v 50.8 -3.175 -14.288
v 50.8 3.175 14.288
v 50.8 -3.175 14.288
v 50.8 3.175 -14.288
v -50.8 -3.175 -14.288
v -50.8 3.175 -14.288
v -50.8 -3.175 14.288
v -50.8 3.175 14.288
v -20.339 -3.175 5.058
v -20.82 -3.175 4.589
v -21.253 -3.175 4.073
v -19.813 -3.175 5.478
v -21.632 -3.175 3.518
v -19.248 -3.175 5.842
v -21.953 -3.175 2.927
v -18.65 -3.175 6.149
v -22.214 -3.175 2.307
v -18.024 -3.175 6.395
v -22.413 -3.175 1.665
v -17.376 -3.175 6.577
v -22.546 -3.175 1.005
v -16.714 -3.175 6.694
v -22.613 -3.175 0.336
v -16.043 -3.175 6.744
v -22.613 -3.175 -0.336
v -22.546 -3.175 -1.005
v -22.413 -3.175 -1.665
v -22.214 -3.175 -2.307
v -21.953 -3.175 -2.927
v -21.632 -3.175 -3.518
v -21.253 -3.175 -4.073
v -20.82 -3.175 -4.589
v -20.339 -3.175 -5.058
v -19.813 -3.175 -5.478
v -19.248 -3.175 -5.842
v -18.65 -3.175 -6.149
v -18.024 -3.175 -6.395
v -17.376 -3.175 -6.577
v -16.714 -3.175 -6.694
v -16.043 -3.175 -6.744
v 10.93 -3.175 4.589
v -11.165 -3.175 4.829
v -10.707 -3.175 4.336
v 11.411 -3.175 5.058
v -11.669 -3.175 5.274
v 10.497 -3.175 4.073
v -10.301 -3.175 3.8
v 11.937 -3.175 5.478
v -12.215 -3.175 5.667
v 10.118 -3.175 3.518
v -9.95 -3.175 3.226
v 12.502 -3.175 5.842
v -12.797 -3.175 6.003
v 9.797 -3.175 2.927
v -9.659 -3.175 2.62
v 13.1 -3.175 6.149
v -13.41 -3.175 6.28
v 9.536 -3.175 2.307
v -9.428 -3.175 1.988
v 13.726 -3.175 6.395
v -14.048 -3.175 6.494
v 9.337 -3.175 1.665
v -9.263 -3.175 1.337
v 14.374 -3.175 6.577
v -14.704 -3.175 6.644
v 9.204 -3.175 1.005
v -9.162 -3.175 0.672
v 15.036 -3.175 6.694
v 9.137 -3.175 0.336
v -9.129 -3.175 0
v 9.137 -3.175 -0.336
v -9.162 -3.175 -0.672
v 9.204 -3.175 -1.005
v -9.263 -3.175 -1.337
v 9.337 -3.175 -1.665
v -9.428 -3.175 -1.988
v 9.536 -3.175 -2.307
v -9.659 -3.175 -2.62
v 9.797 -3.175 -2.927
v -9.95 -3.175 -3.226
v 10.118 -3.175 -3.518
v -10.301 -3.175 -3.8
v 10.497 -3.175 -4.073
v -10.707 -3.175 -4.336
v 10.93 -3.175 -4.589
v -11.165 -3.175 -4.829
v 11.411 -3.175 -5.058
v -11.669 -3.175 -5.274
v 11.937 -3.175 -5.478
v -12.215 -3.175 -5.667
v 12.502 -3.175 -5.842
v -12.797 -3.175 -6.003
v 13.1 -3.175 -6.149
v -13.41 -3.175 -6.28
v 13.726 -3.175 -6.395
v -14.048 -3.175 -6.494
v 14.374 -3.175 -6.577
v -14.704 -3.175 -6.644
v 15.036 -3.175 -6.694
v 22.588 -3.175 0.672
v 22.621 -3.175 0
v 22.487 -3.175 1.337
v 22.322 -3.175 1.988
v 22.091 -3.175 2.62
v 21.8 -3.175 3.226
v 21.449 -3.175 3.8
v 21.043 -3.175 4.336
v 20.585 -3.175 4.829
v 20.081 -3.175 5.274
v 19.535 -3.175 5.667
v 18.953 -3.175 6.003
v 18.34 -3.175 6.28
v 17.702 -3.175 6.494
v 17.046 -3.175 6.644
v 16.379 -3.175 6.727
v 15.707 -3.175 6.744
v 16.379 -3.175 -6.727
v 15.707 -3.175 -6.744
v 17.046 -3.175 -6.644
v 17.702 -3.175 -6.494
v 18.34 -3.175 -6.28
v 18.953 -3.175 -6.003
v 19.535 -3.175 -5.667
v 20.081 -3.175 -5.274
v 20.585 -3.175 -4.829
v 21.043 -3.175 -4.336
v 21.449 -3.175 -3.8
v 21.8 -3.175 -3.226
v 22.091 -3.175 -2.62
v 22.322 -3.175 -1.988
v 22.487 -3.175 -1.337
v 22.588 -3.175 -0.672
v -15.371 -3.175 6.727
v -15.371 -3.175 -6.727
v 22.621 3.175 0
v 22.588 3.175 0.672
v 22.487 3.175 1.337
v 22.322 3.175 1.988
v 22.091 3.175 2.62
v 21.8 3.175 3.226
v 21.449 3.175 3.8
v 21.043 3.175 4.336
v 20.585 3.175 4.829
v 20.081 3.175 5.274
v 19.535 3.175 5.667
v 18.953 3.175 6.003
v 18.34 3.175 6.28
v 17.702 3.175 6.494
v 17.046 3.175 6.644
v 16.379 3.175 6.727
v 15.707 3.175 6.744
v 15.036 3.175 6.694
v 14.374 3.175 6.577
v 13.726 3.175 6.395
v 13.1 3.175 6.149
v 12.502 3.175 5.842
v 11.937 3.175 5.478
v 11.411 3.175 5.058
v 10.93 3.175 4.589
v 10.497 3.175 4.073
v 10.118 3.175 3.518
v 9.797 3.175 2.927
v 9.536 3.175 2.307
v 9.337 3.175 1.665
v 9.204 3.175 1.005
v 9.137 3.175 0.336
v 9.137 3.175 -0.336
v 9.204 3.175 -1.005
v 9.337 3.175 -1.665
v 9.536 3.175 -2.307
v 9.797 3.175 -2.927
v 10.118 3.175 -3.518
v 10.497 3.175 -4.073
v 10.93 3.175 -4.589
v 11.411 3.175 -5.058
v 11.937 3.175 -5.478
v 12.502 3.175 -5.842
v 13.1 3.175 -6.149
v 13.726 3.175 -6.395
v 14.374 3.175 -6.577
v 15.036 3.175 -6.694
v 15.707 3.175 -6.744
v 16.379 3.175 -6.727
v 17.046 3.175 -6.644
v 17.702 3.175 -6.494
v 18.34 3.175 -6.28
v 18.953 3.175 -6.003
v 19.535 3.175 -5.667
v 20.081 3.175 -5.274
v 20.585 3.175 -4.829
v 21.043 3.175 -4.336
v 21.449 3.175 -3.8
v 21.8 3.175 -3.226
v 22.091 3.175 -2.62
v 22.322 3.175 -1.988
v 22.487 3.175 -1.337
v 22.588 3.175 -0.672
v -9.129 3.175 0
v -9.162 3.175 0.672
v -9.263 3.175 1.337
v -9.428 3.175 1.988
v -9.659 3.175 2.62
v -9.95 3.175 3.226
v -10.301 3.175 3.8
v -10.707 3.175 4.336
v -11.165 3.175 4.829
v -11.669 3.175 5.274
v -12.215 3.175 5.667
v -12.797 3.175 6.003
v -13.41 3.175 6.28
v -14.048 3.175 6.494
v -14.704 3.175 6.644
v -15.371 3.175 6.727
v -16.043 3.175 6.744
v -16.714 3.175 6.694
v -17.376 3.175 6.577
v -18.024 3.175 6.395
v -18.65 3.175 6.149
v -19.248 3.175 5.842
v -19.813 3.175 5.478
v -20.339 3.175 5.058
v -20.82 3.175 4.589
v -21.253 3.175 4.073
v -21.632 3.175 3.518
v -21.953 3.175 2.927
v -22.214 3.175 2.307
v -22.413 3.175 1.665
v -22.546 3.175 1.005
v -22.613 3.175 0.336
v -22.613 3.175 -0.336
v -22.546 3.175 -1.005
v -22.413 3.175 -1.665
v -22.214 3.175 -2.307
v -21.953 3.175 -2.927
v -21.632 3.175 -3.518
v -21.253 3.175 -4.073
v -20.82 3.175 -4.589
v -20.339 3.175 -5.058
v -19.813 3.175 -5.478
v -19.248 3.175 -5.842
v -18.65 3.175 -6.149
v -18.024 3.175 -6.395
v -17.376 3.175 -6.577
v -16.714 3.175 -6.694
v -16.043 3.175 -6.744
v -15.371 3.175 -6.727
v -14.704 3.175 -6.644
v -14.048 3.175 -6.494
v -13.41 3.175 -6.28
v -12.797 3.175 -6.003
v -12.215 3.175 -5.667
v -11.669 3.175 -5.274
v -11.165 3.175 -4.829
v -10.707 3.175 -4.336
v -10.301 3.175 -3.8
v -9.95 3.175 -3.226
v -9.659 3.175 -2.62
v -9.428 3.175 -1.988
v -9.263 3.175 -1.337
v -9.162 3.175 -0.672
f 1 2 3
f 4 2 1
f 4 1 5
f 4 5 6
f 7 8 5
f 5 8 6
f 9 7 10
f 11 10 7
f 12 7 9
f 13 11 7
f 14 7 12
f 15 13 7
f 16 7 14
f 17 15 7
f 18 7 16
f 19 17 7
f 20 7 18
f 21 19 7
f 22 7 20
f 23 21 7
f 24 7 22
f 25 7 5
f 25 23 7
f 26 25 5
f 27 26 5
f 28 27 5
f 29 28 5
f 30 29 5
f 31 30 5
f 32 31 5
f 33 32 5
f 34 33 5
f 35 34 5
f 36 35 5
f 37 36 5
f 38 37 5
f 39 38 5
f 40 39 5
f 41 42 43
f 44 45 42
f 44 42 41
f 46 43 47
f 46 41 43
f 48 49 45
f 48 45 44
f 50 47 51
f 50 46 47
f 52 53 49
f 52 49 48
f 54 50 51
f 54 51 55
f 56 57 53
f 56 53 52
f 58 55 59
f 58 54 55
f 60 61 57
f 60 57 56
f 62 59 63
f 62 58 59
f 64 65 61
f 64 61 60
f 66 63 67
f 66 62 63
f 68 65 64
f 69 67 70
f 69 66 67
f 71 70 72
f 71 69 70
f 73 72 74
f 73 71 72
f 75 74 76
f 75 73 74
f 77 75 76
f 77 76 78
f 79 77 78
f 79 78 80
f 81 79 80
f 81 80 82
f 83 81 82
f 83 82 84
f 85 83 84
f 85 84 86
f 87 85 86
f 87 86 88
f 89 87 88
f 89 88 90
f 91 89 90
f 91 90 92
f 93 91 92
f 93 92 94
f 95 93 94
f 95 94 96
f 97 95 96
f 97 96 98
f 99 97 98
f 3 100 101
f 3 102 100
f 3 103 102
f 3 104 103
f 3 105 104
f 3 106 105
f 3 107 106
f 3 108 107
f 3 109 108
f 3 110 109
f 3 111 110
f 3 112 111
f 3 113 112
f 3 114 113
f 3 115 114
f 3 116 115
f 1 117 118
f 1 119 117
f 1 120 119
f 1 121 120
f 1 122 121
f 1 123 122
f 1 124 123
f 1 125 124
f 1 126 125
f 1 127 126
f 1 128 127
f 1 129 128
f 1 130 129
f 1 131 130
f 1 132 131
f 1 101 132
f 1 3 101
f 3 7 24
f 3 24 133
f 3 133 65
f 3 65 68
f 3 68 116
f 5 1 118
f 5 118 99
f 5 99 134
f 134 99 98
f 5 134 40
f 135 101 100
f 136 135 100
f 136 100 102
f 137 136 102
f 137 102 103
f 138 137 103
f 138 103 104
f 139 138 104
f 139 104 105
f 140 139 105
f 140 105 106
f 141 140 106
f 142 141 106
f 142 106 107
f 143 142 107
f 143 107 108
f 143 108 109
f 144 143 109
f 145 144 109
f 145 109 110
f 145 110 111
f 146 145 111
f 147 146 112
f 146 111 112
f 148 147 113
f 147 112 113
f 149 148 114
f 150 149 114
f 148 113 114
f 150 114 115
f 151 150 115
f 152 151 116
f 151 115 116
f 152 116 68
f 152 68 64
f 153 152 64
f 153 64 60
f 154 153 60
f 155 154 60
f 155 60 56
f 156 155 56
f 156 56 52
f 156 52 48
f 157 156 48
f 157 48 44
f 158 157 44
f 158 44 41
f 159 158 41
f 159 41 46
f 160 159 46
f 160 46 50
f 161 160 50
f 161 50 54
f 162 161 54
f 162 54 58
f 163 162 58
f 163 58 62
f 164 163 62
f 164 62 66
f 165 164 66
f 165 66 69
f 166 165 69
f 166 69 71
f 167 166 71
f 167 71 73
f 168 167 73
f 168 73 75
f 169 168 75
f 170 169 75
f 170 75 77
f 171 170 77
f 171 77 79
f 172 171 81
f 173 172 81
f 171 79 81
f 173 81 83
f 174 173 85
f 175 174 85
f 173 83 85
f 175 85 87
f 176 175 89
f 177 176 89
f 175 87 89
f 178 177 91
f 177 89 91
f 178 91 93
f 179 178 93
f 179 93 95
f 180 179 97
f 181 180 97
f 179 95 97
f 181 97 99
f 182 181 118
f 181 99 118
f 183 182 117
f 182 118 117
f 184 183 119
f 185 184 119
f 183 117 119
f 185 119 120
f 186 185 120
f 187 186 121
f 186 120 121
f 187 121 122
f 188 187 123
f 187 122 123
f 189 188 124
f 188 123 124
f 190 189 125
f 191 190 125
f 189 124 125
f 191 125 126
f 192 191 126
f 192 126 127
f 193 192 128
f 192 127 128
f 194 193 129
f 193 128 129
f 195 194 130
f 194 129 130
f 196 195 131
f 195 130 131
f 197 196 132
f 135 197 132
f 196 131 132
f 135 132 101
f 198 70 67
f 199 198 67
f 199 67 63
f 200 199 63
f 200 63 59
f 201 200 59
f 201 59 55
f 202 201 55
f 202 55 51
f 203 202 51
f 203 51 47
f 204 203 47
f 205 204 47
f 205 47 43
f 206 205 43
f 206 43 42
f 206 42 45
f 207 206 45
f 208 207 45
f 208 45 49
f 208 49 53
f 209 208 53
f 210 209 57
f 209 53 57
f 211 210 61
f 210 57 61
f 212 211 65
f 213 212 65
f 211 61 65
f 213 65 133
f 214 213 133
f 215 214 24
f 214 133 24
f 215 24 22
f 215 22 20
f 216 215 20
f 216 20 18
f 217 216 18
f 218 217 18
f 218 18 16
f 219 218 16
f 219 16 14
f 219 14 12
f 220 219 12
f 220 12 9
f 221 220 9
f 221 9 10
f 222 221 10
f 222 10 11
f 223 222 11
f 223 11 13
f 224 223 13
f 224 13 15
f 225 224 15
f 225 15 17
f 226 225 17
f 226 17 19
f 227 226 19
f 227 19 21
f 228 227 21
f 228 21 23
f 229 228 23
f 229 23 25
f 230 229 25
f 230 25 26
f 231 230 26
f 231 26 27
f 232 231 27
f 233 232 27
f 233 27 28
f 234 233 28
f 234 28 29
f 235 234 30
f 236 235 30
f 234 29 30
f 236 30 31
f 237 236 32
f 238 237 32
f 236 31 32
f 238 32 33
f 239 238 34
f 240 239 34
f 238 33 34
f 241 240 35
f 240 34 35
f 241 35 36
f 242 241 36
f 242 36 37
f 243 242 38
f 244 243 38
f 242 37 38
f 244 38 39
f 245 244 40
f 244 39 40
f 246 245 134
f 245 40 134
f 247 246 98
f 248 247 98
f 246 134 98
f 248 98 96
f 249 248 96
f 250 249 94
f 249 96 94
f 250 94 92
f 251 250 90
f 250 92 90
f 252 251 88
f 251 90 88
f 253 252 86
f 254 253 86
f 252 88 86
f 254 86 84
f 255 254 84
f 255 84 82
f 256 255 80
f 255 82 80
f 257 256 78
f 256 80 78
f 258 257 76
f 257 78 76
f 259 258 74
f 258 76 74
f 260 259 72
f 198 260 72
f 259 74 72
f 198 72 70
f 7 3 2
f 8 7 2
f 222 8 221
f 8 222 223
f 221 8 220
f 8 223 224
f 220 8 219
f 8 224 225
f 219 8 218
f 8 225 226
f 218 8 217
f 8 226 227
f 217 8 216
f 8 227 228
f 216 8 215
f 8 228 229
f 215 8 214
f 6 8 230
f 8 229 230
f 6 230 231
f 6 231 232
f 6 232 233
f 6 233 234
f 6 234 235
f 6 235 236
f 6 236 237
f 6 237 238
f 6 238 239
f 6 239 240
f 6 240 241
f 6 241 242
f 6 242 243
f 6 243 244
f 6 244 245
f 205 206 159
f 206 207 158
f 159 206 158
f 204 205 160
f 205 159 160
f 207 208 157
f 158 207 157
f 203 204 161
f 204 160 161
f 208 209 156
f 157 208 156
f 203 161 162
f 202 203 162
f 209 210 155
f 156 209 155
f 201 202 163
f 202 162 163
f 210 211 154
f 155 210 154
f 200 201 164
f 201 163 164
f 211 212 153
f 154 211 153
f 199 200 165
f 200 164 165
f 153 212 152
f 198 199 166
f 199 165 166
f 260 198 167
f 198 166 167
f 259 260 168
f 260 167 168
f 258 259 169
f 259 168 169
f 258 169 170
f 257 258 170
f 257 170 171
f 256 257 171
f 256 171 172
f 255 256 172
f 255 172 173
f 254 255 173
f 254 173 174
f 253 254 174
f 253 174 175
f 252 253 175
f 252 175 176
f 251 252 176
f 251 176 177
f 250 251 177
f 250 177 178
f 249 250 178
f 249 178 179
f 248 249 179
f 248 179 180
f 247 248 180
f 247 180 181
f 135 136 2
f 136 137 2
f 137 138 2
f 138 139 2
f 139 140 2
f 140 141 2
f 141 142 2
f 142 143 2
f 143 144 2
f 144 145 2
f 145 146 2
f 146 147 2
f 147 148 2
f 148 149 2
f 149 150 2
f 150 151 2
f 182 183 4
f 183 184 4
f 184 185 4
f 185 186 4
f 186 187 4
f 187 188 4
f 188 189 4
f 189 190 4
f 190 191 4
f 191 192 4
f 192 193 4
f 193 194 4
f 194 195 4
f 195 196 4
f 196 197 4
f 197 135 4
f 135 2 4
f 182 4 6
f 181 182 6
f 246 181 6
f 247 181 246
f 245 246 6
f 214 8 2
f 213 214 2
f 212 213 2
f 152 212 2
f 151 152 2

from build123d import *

# Parameters (mm, degrees)
SKETCH1_W               = 28.575
SKETCH1_H               = 6.35
EXTRUDE1_DEPTH          = 50.8
EXTRUDE1_DEPTH_BACK     = 50.8
F_1_2_CLEARANCE_HOLE1_D = 13.49248


with BuildPart() as part:
    # Sketch1 → Extrude1 (new body, two sides)
    with BuildSketch(Plane(origin=(0, 0, 0), x_dir=(0, 0, -1), z_dir=(1, 0, 0))) as extrude1_sk:
        Rectangle(SKETCH1_W, SKETCH1_H)
    extrude(amount=EXTRUDE1_DEPTH)
    extrude(extrude1_sk.sketch, amount=-EXTRUDE1_DEPTH_BACK)

    # 1_2 Clearance Hole1 (through all)
    with Locations(Plane(origin=(0, 3.175, 0), x_dir=(-1, 0, 0), z_dir=(0, 1, 0))):
        with Locations((15.875, 0), (-15.875, 0)):
            Hole(F_1_2_CLEARANCE_HOLE1_D / 2)


solid = part.part
